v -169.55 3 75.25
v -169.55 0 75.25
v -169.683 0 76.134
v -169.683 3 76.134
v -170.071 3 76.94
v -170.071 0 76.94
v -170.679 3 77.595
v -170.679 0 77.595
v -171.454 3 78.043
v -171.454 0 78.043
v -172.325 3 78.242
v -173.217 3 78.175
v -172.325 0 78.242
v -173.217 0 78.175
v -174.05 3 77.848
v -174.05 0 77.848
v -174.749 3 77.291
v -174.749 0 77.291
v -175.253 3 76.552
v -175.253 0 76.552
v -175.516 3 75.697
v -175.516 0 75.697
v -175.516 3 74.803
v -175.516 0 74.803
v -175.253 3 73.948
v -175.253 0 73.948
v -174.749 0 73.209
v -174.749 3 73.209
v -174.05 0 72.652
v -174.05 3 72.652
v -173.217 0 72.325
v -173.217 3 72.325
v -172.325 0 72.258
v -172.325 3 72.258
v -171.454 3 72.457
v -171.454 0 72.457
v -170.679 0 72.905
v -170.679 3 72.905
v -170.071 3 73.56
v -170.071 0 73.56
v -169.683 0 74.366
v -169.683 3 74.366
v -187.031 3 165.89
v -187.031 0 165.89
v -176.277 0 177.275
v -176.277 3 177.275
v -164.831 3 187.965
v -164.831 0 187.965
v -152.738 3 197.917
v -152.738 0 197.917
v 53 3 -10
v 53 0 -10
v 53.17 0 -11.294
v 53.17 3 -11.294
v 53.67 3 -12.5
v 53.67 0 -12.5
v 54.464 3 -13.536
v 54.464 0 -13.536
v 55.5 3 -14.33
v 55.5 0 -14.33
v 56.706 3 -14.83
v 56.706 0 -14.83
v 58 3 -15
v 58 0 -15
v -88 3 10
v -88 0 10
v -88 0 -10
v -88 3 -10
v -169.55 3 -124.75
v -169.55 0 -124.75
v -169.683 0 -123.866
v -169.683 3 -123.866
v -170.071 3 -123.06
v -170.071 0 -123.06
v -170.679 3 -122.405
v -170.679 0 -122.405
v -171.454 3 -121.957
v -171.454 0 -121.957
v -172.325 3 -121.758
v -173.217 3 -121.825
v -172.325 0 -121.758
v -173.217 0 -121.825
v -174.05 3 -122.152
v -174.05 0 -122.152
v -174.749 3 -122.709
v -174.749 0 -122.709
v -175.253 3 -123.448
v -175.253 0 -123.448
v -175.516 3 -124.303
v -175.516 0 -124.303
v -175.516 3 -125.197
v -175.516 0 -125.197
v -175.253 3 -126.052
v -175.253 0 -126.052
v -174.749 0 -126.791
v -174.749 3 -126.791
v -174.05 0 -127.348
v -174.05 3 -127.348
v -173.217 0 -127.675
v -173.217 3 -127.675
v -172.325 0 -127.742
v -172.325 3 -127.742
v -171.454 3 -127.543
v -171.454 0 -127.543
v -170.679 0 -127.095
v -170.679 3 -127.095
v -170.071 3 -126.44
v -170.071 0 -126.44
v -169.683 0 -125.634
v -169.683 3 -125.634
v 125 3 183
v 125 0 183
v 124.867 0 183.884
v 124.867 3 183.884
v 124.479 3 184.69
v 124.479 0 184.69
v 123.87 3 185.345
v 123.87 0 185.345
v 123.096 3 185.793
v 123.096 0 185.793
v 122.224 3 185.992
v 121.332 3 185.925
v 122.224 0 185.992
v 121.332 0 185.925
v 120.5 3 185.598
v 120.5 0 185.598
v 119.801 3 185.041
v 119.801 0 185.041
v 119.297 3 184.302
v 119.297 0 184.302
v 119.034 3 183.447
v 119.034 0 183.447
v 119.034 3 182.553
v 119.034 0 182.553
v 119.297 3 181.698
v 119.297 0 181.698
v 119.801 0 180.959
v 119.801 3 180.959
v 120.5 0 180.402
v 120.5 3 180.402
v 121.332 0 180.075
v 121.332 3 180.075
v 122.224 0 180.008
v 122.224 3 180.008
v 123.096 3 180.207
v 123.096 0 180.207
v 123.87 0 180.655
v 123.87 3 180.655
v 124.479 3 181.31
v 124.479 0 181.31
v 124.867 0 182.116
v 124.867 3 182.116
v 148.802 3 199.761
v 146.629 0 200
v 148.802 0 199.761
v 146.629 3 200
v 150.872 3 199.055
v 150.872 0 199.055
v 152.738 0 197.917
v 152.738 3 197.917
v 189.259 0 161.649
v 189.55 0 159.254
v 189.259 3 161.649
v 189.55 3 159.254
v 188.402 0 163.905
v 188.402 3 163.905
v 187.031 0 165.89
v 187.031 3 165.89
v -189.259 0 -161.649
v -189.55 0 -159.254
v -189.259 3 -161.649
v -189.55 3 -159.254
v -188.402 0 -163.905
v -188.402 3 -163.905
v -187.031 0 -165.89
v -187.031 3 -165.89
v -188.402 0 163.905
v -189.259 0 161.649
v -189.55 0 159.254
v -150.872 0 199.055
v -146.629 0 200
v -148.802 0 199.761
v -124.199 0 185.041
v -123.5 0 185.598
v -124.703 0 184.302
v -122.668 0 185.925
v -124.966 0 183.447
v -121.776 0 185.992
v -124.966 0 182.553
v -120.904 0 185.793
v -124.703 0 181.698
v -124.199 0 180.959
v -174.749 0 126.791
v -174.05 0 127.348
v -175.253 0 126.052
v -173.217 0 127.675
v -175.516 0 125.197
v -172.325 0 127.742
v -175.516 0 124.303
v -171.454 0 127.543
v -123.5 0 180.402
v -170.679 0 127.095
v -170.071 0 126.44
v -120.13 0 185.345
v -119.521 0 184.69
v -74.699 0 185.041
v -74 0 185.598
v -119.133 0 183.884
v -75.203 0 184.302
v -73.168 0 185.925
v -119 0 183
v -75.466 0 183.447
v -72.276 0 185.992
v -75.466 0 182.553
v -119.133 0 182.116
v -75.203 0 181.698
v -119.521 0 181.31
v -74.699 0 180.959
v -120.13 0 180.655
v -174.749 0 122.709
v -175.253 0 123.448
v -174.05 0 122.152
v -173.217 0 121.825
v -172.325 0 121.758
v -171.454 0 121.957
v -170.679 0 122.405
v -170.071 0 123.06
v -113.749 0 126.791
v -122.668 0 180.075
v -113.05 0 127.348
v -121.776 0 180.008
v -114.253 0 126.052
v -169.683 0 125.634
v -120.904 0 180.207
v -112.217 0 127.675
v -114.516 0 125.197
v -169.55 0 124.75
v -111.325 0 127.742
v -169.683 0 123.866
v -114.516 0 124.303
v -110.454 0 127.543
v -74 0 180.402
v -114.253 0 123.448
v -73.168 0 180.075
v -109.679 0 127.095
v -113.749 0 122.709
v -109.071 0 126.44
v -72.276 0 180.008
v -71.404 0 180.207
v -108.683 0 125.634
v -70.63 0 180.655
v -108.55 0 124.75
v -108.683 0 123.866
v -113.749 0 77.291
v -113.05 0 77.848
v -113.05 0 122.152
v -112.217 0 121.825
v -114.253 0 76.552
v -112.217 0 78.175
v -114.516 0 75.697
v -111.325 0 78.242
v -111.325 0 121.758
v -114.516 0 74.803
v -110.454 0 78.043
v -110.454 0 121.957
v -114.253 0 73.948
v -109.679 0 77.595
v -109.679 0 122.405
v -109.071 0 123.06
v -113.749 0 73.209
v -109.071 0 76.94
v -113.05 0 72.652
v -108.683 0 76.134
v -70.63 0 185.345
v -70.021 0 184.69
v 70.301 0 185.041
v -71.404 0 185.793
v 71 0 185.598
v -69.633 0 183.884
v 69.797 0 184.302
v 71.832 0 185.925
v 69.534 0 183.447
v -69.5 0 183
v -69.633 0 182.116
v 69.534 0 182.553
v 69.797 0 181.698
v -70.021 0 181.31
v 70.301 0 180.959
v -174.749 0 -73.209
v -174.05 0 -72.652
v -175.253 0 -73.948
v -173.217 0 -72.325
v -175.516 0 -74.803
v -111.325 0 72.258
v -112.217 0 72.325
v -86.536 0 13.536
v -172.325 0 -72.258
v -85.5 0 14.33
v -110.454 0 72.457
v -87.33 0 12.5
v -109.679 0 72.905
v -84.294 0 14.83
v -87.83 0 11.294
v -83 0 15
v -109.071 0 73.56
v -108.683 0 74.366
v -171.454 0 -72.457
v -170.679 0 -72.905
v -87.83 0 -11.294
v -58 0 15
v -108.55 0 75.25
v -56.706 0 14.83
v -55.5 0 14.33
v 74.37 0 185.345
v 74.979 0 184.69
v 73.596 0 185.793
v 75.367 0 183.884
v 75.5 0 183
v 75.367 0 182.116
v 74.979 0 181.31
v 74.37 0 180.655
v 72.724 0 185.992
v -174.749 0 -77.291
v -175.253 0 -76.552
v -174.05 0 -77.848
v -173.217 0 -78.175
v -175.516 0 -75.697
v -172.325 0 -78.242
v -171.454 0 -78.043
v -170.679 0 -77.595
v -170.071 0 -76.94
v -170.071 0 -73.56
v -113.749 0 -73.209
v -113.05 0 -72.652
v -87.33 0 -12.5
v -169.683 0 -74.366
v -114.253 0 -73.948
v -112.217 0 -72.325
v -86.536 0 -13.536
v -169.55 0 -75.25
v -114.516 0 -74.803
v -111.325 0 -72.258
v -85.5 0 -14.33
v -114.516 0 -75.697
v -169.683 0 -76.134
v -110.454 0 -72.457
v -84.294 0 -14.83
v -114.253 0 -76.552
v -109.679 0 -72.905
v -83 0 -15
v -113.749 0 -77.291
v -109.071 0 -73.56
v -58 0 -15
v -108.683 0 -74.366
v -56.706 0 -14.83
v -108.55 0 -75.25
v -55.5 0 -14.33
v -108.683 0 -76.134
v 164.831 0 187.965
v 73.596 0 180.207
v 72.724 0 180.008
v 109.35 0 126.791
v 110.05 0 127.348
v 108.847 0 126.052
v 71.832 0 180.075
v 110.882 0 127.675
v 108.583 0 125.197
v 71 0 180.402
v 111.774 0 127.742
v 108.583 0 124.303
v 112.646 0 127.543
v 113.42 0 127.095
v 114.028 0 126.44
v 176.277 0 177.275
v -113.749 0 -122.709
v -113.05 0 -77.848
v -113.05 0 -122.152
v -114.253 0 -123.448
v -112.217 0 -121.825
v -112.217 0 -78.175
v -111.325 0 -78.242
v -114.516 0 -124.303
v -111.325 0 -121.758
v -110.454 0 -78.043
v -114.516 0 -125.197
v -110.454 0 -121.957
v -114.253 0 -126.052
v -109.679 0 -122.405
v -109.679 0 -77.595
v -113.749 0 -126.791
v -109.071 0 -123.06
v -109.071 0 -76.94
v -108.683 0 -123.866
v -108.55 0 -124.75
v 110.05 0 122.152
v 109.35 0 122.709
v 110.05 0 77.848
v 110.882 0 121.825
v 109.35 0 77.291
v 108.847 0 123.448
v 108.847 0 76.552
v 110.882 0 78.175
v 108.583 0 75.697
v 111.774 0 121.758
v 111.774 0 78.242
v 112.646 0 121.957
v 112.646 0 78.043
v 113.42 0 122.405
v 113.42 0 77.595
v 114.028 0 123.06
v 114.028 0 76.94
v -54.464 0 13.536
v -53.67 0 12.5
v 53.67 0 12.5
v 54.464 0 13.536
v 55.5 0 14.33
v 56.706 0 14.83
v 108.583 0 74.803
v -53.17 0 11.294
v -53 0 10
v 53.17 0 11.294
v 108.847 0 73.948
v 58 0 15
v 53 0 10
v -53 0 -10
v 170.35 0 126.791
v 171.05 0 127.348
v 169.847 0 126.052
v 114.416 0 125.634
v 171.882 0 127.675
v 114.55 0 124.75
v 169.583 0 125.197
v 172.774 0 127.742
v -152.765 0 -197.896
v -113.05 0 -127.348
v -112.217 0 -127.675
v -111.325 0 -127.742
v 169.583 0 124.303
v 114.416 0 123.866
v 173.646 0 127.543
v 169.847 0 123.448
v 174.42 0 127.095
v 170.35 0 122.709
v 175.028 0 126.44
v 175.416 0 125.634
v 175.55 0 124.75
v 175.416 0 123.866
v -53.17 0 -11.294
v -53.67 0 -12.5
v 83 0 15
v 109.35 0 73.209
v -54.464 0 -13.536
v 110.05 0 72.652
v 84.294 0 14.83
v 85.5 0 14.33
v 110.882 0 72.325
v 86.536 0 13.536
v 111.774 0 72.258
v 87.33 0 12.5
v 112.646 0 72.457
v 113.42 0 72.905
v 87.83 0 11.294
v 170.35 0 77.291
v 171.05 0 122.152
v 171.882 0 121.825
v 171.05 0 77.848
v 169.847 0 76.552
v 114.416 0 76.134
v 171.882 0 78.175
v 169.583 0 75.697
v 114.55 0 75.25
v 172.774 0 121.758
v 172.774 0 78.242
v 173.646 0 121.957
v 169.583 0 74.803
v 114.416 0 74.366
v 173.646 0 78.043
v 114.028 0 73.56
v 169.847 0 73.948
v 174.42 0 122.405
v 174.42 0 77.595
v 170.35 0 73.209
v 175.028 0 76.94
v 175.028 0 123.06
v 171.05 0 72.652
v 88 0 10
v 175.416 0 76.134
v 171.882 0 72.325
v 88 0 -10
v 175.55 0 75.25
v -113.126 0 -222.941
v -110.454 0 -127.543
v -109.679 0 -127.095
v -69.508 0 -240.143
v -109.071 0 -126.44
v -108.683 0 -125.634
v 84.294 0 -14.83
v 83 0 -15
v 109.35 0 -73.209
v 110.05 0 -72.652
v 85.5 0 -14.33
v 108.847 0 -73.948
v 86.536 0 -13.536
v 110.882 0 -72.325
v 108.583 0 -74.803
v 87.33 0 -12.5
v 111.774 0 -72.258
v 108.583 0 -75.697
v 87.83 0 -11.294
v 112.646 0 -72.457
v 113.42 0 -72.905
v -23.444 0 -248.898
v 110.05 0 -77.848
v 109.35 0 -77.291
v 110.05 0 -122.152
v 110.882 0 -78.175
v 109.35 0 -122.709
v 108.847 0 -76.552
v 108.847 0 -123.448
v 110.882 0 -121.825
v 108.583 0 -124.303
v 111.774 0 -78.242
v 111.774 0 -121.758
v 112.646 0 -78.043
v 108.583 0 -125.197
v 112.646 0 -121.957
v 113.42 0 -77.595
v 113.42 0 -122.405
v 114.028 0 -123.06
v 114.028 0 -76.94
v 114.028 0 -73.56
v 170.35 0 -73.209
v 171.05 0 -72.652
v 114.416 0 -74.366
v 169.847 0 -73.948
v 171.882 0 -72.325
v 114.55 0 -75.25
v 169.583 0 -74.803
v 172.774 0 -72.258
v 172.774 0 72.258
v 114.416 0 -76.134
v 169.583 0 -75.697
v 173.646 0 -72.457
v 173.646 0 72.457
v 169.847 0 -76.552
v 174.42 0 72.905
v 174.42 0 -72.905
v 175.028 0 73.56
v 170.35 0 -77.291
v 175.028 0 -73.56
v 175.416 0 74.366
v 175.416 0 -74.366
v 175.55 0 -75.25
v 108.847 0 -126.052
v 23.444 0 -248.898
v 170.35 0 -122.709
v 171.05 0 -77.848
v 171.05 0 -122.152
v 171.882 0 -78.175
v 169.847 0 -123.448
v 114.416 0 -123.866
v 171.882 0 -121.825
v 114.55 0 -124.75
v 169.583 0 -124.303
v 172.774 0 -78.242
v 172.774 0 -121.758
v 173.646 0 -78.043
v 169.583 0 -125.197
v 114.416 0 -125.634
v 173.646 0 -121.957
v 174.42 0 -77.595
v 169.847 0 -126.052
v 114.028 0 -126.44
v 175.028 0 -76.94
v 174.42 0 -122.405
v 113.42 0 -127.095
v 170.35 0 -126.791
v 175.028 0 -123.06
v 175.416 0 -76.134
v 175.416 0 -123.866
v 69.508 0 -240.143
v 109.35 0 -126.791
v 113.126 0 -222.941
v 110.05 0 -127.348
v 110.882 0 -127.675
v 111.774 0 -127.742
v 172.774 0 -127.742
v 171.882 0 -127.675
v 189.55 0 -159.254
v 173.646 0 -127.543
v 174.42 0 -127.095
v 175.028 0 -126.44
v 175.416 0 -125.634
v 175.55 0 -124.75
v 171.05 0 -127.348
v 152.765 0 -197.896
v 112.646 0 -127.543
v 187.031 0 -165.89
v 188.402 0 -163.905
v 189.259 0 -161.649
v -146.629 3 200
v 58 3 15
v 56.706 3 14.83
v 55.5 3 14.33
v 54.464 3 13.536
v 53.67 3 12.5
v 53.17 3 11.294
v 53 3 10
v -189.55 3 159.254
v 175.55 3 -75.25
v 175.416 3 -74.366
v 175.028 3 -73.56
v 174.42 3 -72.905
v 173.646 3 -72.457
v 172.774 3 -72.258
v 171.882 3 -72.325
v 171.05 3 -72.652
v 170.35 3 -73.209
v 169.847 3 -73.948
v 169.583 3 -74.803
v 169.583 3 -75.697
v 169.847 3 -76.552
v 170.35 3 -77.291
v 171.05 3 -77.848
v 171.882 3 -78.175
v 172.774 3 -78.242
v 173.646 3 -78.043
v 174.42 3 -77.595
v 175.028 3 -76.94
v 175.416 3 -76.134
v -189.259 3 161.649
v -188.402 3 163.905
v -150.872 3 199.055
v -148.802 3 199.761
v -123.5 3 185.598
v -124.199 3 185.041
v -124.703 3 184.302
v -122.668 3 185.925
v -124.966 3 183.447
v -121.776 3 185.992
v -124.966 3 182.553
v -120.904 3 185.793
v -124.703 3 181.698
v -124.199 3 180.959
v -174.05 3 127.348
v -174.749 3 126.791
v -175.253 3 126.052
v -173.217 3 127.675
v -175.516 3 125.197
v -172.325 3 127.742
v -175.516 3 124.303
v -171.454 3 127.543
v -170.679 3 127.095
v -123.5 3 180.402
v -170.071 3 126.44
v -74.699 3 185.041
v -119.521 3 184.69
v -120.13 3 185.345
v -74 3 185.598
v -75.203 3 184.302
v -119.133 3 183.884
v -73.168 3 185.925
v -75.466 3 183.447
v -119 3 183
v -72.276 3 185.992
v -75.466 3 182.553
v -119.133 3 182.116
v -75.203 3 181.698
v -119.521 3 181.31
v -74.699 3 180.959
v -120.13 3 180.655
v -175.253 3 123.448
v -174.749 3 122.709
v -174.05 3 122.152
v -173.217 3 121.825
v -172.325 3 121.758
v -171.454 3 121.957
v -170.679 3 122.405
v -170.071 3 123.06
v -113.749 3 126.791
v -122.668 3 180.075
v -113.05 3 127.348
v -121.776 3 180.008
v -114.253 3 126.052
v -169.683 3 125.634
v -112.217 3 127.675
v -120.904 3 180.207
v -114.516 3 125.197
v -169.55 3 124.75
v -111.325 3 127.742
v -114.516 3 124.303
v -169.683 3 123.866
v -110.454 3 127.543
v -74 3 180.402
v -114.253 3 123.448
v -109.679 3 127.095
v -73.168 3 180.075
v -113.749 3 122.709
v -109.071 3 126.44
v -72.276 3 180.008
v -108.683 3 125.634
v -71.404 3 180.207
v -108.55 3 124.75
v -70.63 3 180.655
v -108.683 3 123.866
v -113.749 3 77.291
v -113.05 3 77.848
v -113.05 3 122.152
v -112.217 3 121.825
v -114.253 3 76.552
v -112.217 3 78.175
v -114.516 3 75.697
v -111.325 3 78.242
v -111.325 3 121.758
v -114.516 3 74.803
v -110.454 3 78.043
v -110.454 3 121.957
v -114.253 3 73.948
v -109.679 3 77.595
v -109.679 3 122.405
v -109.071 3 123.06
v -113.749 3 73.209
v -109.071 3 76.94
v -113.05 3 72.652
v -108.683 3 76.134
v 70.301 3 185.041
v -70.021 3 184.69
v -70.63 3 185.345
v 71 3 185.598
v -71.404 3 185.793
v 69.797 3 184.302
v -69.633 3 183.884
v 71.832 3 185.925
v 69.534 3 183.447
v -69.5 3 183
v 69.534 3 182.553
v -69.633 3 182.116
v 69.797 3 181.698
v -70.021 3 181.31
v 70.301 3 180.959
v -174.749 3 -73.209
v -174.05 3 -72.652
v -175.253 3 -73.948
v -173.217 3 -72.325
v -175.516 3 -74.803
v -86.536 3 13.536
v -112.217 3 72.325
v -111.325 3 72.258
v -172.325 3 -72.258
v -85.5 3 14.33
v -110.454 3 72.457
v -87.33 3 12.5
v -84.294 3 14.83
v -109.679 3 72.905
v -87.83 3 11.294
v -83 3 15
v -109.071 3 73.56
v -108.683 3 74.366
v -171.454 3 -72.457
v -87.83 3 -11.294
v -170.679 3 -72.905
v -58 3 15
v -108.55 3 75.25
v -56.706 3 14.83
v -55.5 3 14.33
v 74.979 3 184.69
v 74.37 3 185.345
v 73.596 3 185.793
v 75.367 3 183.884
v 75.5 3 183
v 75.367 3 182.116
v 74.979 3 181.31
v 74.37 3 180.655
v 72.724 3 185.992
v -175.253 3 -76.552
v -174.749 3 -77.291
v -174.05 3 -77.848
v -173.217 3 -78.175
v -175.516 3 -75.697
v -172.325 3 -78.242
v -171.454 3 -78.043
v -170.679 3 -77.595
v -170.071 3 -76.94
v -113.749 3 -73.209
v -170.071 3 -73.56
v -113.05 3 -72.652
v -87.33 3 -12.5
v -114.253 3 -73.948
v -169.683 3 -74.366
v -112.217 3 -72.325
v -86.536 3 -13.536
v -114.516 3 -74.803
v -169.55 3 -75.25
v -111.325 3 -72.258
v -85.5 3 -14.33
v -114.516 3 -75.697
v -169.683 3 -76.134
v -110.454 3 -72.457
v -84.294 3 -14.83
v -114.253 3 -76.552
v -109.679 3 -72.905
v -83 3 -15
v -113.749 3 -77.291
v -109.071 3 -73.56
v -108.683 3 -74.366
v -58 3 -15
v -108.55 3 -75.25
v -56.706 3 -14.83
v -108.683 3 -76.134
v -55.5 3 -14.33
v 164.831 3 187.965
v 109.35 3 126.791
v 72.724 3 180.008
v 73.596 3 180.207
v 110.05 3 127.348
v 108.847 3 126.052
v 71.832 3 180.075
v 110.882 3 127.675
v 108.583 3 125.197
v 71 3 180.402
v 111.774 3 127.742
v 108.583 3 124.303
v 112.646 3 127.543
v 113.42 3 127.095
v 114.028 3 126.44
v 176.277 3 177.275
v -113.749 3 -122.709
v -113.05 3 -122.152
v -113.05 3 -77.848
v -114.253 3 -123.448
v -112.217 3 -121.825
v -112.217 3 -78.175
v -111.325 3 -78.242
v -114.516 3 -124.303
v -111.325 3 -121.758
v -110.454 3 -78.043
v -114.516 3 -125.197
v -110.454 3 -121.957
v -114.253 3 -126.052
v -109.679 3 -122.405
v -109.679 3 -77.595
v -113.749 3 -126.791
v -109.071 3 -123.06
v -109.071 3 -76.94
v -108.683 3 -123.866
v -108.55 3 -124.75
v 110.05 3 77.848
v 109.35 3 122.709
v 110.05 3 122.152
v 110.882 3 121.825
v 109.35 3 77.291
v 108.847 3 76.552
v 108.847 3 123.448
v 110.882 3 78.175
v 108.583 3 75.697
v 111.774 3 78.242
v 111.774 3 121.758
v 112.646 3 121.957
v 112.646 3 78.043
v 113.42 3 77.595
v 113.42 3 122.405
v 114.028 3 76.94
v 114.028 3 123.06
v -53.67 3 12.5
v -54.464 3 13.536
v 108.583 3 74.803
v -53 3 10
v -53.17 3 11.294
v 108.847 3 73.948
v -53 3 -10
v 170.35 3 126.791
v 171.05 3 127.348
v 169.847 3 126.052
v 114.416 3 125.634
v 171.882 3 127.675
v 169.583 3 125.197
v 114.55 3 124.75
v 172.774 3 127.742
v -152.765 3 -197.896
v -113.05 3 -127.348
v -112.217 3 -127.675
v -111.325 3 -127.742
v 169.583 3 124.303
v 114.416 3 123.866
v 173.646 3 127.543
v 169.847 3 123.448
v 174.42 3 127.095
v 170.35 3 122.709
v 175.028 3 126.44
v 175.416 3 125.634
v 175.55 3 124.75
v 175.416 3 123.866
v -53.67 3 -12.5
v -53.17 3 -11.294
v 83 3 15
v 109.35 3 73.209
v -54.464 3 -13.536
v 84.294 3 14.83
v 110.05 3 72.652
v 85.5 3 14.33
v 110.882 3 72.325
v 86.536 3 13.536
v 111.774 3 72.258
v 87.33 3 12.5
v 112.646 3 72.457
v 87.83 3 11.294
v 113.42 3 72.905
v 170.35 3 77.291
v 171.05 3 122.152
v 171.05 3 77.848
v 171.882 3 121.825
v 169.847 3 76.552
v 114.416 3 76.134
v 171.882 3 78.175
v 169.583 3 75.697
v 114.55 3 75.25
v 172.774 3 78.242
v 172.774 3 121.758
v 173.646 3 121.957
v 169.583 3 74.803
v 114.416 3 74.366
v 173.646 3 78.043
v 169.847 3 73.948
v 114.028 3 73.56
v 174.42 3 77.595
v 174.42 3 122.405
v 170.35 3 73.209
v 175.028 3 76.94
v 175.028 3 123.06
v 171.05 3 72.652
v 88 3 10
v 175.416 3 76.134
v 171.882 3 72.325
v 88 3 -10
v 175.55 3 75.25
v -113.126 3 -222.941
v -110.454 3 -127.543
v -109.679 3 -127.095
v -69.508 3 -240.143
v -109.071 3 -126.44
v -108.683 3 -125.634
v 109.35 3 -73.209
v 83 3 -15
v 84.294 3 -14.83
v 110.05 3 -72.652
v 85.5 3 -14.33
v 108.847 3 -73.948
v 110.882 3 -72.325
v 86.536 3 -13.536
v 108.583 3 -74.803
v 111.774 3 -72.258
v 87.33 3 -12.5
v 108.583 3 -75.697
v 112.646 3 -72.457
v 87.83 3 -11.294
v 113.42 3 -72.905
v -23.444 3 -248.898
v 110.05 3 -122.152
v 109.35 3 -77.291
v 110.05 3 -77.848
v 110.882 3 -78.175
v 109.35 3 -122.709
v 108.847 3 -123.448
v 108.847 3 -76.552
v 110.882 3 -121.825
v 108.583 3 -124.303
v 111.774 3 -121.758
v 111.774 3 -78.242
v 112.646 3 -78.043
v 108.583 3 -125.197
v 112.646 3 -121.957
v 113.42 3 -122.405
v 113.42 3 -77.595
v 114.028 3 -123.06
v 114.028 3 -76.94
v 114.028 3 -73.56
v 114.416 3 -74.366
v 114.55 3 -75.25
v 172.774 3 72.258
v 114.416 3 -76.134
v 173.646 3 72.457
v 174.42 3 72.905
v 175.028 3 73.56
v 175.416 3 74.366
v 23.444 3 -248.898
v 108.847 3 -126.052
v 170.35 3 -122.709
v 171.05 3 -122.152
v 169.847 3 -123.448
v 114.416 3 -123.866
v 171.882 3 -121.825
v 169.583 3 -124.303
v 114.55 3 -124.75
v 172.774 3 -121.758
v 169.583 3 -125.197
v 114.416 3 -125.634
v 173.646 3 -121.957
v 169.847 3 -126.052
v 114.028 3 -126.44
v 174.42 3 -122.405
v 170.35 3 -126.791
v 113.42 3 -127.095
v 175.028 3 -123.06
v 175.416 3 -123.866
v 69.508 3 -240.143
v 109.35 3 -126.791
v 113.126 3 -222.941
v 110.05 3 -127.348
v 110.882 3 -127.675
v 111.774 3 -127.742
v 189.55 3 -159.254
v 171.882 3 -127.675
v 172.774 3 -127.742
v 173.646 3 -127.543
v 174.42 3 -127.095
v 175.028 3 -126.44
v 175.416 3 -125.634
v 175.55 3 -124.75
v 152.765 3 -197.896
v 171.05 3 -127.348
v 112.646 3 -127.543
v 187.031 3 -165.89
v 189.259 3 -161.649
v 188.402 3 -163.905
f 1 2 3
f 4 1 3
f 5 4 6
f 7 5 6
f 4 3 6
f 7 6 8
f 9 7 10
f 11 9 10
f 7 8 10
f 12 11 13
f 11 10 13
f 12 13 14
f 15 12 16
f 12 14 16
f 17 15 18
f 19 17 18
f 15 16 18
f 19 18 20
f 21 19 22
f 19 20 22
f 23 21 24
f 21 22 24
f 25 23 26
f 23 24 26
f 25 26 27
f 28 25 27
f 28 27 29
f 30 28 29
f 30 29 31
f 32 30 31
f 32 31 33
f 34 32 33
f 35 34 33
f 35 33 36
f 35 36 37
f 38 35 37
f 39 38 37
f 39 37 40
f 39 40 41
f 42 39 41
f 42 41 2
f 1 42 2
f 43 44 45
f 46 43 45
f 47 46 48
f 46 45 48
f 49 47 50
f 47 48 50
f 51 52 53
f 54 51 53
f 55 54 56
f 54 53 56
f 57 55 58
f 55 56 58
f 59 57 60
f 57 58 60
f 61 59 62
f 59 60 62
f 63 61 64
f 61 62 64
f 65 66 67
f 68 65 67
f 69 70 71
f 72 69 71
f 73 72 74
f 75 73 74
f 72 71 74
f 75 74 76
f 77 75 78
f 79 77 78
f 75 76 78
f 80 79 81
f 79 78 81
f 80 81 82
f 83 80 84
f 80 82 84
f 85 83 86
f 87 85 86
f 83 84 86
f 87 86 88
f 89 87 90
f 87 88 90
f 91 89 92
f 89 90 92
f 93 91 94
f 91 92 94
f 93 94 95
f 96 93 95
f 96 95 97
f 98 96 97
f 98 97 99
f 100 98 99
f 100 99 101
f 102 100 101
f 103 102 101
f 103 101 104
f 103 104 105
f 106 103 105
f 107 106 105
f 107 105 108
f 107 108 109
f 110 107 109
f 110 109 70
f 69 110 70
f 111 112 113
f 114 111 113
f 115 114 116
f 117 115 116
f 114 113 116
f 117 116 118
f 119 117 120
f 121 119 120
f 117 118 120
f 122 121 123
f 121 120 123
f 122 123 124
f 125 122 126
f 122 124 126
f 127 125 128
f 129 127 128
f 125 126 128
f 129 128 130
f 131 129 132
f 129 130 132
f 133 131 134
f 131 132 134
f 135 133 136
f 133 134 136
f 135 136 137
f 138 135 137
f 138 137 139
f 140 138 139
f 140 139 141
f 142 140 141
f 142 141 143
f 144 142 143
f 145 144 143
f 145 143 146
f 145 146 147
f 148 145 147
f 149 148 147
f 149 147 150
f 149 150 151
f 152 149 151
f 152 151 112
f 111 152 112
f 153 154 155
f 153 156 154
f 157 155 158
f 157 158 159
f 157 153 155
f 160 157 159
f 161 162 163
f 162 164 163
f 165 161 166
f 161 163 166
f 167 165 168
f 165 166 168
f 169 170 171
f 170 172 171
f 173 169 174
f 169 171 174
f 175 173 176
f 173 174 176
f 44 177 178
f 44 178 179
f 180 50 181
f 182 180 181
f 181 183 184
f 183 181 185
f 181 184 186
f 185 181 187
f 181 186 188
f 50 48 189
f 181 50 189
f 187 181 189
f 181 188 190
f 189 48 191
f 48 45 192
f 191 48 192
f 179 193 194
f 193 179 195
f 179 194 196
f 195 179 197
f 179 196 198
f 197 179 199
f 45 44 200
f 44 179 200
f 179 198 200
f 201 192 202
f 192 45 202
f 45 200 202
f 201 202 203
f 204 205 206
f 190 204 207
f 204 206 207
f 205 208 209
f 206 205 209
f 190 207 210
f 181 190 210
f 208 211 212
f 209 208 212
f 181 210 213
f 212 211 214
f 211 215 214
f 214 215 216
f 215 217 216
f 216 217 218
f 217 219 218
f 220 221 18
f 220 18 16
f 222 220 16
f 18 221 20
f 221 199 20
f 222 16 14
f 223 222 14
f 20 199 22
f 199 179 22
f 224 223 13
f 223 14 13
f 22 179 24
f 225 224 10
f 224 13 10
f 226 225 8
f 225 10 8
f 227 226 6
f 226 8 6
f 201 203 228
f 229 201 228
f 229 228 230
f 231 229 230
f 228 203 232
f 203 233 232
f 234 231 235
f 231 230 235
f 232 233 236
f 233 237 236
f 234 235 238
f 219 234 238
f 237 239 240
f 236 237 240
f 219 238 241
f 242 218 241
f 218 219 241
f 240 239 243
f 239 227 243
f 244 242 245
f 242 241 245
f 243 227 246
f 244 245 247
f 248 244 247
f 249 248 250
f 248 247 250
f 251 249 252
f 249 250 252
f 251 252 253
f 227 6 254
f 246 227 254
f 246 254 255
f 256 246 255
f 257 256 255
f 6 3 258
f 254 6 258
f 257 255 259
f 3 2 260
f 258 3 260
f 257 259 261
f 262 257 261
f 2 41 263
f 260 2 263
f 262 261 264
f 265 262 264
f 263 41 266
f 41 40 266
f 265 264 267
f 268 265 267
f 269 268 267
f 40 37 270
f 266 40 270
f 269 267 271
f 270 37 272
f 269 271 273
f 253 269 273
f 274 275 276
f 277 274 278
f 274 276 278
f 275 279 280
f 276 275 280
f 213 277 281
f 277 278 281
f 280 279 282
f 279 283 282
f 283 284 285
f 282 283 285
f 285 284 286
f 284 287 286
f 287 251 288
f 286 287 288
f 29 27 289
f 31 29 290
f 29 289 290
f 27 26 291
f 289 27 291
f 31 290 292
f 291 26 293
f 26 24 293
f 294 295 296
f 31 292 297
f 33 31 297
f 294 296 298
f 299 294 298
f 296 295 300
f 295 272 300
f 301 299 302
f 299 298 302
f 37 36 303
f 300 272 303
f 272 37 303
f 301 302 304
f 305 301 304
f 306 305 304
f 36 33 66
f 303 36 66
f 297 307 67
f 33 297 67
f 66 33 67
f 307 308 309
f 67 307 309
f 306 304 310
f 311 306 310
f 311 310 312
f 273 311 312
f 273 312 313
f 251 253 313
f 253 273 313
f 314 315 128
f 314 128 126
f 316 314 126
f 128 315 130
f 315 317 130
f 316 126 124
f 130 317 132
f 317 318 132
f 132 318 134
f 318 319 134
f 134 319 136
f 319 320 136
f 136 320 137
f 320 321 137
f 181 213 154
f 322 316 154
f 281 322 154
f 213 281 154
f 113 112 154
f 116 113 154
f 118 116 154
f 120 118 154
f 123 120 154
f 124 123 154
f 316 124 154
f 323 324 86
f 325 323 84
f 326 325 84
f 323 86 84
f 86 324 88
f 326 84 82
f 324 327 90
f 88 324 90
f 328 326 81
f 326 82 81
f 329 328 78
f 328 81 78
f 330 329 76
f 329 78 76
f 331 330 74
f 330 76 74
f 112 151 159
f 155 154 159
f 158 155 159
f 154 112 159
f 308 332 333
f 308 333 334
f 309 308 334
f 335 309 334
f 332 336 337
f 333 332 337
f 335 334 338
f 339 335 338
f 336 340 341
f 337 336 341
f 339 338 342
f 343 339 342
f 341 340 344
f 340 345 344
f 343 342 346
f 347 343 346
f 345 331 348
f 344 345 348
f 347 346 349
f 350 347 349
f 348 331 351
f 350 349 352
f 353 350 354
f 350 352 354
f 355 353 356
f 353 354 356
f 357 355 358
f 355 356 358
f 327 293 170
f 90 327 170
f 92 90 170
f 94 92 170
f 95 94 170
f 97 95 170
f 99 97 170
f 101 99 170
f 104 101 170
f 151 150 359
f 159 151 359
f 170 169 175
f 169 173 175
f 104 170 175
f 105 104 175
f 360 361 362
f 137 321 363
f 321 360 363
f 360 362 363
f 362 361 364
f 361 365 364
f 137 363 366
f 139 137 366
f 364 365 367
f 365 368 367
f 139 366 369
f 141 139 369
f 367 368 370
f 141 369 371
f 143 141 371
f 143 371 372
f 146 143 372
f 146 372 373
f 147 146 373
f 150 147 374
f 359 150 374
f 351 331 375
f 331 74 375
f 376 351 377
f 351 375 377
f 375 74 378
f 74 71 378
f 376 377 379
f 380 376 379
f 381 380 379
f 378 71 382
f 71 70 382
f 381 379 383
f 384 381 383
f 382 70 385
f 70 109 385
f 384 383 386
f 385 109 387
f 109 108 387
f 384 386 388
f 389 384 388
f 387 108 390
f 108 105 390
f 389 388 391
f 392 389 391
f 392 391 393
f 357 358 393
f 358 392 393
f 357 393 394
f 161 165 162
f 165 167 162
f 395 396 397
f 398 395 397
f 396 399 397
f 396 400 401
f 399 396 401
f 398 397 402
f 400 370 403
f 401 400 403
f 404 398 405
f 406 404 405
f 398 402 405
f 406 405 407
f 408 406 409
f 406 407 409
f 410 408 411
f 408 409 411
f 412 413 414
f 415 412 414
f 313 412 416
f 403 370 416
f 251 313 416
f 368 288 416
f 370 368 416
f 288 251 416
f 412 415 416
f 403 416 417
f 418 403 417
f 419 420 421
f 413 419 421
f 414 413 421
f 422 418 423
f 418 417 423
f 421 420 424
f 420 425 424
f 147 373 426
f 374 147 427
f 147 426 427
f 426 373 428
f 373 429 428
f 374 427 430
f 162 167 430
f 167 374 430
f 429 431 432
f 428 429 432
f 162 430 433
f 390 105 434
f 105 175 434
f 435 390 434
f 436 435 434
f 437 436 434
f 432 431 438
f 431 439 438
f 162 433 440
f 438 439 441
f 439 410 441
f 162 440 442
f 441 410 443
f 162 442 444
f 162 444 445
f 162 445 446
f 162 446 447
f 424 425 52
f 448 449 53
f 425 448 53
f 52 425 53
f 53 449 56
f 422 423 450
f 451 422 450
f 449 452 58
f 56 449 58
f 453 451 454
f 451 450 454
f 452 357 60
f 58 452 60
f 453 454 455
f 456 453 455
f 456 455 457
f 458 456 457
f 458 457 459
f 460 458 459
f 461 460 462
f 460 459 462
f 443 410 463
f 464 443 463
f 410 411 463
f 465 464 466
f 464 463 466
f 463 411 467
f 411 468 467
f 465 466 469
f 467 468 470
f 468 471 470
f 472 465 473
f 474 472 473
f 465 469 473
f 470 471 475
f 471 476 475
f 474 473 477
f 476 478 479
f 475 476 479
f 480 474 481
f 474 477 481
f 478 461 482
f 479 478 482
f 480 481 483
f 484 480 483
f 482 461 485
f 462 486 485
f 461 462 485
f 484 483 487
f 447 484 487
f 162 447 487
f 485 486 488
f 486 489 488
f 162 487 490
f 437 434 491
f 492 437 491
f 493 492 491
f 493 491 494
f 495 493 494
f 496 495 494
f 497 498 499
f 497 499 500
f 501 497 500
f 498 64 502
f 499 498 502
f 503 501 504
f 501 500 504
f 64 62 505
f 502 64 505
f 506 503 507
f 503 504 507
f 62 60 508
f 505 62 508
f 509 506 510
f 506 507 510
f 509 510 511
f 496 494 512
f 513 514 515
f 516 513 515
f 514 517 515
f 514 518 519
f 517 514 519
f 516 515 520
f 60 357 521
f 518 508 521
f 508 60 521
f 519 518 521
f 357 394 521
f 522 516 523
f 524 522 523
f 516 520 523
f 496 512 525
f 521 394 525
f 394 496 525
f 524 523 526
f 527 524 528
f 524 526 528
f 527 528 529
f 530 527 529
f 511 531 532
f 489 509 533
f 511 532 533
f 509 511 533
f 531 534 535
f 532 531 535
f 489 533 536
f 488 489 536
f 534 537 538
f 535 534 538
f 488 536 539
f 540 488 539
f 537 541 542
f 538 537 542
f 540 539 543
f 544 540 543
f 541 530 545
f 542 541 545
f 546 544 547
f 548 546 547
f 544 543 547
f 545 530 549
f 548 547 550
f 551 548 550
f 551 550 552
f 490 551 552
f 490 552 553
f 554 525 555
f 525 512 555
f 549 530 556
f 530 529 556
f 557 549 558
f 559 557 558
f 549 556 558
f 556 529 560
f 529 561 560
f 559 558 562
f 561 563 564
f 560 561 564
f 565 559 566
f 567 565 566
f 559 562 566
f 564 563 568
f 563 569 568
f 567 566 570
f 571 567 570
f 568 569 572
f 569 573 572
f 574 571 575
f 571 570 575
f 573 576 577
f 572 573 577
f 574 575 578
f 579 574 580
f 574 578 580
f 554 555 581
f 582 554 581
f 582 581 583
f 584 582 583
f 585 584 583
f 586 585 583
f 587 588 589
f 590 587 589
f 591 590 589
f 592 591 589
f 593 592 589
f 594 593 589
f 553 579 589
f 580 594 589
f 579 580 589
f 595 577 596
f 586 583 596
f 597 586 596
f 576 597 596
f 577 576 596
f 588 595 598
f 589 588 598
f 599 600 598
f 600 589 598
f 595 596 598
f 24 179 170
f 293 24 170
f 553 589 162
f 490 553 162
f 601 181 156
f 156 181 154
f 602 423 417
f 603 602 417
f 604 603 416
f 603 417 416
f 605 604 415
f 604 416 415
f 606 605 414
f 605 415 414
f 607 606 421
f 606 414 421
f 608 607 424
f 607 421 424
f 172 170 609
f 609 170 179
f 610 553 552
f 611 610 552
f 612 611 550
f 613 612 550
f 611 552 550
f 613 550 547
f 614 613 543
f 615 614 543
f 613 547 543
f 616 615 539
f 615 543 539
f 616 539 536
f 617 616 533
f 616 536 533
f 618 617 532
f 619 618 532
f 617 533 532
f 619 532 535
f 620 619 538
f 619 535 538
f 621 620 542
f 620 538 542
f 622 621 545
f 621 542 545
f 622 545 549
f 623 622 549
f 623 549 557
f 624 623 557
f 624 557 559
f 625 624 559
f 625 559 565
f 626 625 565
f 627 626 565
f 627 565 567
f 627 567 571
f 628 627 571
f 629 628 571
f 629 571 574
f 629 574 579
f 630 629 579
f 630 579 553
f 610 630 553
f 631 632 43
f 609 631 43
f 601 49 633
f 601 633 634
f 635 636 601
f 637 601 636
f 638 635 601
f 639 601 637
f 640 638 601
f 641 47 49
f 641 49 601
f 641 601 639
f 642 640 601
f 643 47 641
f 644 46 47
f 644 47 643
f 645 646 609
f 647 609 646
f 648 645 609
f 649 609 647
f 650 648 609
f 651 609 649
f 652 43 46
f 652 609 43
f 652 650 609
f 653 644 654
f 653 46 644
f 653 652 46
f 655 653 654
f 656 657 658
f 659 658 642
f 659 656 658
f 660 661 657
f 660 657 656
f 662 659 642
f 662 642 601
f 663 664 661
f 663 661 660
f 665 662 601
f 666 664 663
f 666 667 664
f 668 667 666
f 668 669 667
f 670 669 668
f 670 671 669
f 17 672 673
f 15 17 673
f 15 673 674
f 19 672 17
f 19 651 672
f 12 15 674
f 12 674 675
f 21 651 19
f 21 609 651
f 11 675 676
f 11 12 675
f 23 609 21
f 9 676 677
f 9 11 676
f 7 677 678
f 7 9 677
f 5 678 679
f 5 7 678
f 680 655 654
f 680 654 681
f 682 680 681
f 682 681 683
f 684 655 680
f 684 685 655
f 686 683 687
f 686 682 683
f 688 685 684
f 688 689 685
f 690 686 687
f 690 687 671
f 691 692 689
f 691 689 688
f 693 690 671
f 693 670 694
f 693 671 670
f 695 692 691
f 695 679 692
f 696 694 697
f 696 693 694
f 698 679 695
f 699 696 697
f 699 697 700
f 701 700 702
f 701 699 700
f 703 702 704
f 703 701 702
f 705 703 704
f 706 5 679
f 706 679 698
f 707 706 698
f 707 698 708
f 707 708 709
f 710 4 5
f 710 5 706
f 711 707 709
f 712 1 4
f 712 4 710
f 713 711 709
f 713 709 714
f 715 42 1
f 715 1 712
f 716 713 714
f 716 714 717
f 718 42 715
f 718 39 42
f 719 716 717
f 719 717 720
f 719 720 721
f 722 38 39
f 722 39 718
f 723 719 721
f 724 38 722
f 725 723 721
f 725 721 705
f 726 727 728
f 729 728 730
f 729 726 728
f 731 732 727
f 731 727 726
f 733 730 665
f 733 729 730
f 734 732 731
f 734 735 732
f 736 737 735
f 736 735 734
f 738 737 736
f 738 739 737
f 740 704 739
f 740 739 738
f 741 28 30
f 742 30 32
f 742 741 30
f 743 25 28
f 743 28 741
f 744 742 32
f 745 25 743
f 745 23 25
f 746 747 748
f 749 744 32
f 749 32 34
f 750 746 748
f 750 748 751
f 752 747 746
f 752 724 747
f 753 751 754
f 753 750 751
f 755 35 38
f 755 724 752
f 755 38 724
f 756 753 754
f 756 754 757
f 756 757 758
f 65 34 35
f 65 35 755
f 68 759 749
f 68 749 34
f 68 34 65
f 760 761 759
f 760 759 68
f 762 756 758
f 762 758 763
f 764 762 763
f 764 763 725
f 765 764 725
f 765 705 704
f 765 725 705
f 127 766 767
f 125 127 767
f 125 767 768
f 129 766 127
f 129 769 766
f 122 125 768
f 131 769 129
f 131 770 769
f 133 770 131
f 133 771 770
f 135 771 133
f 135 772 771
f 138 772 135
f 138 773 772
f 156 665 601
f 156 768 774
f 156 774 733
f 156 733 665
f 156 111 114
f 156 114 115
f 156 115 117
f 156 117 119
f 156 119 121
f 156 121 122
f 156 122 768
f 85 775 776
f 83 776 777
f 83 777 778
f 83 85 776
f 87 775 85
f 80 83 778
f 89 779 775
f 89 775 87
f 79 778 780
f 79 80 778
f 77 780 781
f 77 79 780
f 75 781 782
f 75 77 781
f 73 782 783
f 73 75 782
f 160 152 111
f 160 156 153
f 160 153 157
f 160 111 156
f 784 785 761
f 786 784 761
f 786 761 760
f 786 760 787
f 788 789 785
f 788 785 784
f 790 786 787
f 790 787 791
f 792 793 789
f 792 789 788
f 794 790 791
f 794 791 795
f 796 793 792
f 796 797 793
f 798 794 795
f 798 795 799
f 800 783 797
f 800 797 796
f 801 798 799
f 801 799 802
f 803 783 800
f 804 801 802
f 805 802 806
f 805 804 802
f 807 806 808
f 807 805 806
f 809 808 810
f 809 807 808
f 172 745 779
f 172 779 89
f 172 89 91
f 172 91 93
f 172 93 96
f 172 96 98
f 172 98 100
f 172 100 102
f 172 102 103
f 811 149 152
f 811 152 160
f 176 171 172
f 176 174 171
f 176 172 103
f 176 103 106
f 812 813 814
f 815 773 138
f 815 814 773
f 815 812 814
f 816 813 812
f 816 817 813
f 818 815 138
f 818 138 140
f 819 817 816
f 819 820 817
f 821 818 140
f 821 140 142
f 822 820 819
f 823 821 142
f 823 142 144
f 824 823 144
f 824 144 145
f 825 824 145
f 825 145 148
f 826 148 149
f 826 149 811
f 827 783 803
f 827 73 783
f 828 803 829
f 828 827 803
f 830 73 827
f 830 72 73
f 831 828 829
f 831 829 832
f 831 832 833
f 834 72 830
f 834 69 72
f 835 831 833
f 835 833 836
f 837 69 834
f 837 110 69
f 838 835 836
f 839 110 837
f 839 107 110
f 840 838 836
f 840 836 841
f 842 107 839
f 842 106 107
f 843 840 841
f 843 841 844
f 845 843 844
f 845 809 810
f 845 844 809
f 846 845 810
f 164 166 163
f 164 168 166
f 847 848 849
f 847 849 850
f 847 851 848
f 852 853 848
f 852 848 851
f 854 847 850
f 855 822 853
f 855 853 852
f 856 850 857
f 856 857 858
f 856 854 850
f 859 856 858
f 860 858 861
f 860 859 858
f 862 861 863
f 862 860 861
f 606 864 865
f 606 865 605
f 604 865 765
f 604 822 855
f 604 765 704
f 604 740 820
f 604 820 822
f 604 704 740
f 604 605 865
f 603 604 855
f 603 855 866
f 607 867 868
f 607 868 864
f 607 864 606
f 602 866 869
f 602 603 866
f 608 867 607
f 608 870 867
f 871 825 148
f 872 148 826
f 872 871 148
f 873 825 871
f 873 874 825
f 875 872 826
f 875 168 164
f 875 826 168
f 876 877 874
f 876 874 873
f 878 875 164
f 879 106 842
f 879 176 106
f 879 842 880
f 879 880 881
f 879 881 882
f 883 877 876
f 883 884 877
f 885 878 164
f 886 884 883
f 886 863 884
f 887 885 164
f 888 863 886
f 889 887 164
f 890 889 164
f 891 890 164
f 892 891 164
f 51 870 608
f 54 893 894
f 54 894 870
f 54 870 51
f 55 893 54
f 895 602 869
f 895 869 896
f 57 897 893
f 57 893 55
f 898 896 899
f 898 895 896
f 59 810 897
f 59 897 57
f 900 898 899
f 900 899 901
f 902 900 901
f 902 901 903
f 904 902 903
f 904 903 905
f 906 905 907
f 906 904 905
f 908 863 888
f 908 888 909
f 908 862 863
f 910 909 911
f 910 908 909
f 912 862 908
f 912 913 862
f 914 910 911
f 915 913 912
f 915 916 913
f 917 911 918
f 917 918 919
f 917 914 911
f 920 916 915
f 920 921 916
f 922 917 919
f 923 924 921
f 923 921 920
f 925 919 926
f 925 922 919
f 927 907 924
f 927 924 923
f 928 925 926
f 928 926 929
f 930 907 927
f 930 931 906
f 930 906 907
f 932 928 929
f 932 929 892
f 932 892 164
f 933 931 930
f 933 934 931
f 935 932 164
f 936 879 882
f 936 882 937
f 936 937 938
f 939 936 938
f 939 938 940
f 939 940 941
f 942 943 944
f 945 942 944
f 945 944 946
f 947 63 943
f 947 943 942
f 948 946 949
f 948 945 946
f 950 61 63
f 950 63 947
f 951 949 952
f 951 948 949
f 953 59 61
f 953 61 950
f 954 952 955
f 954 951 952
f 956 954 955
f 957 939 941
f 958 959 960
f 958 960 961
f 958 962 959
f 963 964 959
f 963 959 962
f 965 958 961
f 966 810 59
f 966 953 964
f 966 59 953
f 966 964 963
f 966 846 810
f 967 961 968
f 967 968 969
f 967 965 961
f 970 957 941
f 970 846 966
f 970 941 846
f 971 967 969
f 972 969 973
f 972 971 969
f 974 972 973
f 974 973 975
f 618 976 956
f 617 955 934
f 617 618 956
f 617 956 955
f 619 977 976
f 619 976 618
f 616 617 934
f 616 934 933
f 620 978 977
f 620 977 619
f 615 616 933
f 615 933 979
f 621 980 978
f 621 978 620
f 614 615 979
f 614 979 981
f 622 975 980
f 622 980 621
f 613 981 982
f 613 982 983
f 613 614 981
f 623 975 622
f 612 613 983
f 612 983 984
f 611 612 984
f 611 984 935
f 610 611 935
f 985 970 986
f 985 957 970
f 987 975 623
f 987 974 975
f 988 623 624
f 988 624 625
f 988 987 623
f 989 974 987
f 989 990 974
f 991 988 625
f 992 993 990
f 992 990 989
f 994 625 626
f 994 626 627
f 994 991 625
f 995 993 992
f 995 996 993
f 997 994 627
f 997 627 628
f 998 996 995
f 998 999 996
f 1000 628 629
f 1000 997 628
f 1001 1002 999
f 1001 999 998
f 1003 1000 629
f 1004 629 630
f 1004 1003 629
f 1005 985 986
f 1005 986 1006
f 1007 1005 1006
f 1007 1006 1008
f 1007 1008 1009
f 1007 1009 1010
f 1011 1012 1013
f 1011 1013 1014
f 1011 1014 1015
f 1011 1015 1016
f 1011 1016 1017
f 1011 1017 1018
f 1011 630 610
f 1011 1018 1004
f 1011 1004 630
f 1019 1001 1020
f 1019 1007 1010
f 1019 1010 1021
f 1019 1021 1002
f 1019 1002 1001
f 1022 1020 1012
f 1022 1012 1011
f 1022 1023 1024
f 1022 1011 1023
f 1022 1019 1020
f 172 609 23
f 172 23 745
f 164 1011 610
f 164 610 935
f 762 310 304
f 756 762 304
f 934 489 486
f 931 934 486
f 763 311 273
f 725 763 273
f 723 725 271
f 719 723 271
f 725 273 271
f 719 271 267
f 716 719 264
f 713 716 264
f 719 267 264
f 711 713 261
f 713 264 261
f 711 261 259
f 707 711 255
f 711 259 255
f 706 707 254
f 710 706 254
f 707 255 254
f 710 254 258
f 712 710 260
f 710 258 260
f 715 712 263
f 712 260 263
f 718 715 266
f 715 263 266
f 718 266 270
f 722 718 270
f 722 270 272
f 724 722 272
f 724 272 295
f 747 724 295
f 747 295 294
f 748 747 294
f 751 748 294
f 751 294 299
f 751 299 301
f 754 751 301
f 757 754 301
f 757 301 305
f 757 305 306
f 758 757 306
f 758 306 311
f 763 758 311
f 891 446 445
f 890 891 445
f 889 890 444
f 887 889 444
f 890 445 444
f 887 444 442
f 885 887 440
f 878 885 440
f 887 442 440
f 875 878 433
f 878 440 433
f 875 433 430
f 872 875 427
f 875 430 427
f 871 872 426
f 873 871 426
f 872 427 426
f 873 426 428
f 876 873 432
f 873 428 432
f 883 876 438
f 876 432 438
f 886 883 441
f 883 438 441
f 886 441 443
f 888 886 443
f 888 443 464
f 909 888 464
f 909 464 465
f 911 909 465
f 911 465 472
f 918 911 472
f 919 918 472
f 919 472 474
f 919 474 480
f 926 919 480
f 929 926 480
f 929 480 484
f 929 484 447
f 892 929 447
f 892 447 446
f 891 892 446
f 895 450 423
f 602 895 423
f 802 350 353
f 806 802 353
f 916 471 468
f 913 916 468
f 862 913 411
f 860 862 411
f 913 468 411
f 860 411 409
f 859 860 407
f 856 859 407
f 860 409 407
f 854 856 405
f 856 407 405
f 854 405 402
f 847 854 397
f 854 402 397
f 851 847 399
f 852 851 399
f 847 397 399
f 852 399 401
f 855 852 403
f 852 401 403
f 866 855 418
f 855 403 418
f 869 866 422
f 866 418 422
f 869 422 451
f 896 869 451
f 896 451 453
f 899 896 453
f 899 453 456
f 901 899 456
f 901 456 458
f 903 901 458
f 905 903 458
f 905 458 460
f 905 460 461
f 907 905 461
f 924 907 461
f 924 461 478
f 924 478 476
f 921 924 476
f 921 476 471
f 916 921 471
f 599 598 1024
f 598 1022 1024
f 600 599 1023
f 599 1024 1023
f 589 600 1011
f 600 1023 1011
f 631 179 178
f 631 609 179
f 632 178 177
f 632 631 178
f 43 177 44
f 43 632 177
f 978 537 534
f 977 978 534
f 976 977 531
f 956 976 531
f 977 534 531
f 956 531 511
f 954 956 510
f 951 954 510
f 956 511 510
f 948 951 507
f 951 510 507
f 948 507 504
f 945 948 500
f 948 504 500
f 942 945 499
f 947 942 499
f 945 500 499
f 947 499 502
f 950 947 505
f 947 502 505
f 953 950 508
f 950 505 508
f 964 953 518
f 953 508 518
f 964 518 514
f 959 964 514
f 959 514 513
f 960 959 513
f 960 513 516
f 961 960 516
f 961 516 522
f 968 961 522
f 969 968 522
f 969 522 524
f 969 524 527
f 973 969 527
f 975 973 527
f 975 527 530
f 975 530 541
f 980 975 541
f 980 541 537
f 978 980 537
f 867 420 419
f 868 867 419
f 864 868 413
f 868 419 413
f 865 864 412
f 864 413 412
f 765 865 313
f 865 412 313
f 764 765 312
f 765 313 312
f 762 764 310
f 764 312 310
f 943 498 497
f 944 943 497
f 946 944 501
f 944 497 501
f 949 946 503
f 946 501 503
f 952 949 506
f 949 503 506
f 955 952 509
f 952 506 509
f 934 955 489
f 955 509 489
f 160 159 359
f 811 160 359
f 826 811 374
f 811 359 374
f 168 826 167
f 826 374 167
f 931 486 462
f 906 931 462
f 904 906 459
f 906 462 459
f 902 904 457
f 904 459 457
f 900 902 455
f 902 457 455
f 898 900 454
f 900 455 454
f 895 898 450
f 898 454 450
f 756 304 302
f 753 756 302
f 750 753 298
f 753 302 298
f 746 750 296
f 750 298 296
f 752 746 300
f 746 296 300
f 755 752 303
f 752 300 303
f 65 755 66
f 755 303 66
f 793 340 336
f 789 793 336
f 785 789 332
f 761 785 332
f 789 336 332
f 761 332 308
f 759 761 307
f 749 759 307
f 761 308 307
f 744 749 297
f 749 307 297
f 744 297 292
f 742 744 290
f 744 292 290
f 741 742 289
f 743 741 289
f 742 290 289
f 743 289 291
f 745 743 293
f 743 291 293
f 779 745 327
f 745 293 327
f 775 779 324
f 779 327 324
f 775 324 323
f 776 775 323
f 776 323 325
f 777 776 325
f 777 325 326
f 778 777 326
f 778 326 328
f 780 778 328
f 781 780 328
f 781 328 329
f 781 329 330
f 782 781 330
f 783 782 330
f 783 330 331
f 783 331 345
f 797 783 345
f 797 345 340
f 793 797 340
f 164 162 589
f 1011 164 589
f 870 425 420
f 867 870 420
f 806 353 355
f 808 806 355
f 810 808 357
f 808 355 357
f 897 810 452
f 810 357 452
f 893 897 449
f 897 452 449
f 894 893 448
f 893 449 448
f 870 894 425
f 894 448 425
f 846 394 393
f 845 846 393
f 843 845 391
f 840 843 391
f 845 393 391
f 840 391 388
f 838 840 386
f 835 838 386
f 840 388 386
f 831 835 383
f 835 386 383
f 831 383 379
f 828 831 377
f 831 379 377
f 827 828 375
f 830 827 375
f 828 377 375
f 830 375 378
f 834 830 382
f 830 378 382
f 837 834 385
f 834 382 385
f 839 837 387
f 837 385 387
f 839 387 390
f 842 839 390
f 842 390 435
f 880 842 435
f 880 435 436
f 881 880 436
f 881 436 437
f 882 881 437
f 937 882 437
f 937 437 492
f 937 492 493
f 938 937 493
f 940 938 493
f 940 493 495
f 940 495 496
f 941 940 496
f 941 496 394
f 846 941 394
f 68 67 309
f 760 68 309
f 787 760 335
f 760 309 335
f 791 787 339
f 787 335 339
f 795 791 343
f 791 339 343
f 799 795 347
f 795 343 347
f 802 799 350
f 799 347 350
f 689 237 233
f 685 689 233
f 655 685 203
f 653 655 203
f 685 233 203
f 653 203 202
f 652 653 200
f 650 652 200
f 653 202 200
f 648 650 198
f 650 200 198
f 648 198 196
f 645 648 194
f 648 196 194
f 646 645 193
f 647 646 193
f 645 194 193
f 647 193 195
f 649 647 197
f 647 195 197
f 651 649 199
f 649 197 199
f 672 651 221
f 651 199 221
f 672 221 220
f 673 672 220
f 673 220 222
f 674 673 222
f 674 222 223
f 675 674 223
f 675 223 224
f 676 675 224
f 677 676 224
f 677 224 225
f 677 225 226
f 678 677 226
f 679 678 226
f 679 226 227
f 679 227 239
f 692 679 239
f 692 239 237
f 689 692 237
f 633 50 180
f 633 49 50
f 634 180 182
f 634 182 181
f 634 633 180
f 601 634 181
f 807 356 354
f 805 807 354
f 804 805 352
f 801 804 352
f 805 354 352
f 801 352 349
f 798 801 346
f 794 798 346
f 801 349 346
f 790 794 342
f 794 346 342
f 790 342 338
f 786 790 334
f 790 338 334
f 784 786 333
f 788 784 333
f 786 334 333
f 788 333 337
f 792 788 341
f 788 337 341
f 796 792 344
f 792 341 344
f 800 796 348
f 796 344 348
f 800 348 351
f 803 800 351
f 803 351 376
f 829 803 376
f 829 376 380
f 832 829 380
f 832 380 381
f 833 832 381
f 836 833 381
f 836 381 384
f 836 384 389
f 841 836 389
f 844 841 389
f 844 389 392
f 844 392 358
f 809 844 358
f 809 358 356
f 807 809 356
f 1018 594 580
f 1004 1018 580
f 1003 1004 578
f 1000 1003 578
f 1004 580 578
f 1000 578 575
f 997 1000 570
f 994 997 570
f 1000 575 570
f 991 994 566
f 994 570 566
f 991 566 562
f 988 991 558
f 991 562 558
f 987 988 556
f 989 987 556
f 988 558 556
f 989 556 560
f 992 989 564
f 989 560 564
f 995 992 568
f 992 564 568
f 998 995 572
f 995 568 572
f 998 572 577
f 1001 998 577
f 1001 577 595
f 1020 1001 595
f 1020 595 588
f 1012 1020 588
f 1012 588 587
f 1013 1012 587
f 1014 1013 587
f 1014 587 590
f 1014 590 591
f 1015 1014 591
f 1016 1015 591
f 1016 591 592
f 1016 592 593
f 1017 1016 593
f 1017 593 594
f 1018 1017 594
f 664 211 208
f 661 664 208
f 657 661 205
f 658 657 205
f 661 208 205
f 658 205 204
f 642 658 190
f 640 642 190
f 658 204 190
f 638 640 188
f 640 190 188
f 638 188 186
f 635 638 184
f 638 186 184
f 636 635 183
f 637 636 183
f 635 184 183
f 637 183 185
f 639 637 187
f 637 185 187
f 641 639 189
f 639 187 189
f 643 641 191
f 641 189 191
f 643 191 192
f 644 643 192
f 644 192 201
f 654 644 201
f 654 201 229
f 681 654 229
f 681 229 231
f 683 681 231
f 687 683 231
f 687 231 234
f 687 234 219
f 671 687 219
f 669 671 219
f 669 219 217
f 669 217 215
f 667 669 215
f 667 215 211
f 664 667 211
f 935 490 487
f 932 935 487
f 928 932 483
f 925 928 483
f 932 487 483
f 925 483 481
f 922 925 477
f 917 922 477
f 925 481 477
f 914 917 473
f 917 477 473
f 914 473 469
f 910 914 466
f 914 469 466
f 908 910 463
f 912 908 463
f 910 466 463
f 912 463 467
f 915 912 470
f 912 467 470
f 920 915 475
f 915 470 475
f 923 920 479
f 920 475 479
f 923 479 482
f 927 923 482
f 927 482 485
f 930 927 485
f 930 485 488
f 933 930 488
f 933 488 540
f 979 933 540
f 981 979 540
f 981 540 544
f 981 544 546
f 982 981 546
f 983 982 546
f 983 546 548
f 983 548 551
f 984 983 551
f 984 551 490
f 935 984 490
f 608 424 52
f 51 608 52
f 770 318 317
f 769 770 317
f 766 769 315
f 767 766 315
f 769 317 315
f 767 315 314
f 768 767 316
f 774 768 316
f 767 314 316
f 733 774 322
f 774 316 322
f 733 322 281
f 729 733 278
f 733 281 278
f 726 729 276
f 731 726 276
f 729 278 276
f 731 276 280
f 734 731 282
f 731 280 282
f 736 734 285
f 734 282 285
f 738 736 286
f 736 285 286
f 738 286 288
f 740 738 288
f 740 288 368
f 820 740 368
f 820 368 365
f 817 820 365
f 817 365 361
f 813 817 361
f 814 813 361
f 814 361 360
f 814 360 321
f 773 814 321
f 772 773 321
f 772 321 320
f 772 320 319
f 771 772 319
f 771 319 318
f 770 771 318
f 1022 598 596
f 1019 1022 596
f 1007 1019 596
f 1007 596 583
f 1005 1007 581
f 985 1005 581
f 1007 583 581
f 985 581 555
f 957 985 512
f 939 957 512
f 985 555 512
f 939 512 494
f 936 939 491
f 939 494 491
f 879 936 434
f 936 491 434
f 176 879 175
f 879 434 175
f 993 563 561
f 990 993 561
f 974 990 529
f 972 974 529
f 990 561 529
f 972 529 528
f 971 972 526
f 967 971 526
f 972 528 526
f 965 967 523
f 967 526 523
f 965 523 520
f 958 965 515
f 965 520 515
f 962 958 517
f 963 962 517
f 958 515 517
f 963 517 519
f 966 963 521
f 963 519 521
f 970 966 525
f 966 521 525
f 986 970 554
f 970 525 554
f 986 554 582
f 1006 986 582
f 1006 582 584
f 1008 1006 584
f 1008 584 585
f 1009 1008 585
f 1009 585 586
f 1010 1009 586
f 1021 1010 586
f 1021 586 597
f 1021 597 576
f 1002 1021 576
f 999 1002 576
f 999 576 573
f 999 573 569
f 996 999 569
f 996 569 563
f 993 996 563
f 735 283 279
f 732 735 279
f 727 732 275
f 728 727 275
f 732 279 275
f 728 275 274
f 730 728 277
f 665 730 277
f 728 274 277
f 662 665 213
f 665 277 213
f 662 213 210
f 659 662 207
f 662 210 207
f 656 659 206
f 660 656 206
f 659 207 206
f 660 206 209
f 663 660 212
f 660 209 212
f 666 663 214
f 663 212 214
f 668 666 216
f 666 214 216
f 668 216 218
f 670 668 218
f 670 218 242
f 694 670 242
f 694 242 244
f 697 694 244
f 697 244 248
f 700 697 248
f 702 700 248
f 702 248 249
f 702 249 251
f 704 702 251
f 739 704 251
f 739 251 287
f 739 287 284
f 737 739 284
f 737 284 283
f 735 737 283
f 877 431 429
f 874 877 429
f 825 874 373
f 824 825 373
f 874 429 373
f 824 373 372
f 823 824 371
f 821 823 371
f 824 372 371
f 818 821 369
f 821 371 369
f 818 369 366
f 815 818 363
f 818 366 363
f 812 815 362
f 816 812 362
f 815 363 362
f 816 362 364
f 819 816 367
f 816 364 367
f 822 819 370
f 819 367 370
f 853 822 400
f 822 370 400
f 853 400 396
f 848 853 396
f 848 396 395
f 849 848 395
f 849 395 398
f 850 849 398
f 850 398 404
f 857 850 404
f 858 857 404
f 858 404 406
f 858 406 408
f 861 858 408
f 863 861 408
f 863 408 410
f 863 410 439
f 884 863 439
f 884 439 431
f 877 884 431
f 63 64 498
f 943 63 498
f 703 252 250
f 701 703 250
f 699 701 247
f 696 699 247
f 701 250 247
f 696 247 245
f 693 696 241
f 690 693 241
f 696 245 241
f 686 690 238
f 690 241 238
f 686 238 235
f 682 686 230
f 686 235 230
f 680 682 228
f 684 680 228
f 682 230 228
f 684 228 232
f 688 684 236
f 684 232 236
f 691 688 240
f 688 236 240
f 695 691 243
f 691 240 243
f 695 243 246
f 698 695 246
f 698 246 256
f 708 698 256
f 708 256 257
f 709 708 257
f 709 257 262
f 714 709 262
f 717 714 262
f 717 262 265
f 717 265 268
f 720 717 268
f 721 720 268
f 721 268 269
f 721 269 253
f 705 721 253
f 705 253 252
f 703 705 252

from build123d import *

# Parameters (mm, degrees)
BOSS_EXTRUDE1_DEPTH     = 3
FILLET1_R               = 10
SKETCH2_R               = 3
CUT_EXTRUDE1_DEPTH      = 1
CUT_EXTRUDE1_DEPTH_BACK = 4


with BuildPart() as part:
    # Sketch1 → Boss-Extrude1 (new body)
    with BuildSketch(Plane(origin=(0, 0, 0), x_dir=(1, 0, 0), z_dir=(0, 1, 0))):
        with BuildLine():
            Line((-189.549594269, 163.005985511), (-189.549594269, 15))
            Line((-189.549594269, 15), (-189.549594269, -15))
            Line((-189.549594269, -15), (-189.549594269, -163.005985511))
            ThreePointArc((-189.549594269, -163.005985511), (-170.779451396, -182.577049436), (-150, -200))
            Line((-150, -200), (150, -200))
            ThreePointArc((150, -200), (170.779451396, -182.577049436), (189.549594269, -163.005985511))
            Line((189.549594269, -163.005985511), (189.549594269, -15))
            Line((189.549594269, -15), (189.549594269, 15))
            Line((189.549594269, 15), (189.549594269, 163.005985511))
            ThreePointArc((189.549594269, 163.005985511), (0, 250), (-189.549594269, 163.005985511))
        make_face()
        with BuildLine():
            ThreePointArc((-83, -15), (-86.535533906, -13.535533906), (-88, -10))
            Line((-88, -10), (-88, 10))
            ThreePointArc((-88, 10), (-86.535533906, 13.535533906), (-83, 15))
            Line((-83, 15), (-58, 15))
            ThreePointArc((-58, 15), (-54.464466094, 13.535533906), (-53, 10))
            Line((-53, 10), (-53, -10))
            ThreePointArc((-53, -10), (-54.464466094, -13.535533906), (-58, -15))
            Line((-58, -15), (-83, -15))
        make_face(mode=Mode.SUBTRACT)
        with BuildLine():
            Line((53, -10), (53, 10))
            ThreePointArc((53, 10), (54.464466094, 13.535533906), (58, 15))
            Line((58, 15), (83, 15))
            ThreePointArc((83, 15), (86.535533906, 13.535533906), (88, 10))
            Line((88, 10), (88, -10))
            ThreePointArc((88, -10), (86.535533906, -13.535533906), (83, -15))
            Line((83, -15), (58, -15))
            ThreePointArc((58, -15), (54.464466094, -13.535533906), (53, -10))
        make_face(mode=Mode.SUBTRACT)
    extrude(amount=BOSS_EXTRUDE1_DEPTH)

    # Fillet1
    fillet1_edges = [part.edges().sort_by_distance(p)[0] for p in [
        (189.549594269, 1.5, 163.005985511),
        (150, 1.5, 200),
        (-150, 1.5, 200),
        (-189.549594269, 1.5, 163.005985511),
        (-189.549594269, 1.5, -163.005985511),
        (189.549594269, 1.5, -163.005985511),
    ]]
    fillet(fillet1_edges, radius=FILLET1_R)

    # Sketch2 → Cut-Extrude1 (cut, two sides)
    with BuildSketch(Plane.XZ) as cut_extrude1_sk:
        with Locations((-172.549594269, -124.75)):
            Circle(SKETCH2_R)
        with Locations((-172.549594269, -75.25)):
            Circle(SKETCH2_R)
        with Locations((-111.549594269, -124.75)):
            Circle(SKETCH2_R)
        with Locations((-111.549594269, -75.25)):
            Circle(SKETCH2_R)
        with Locations((111.549594269, -75.25)):
            Circle(SKETCH2_R)
        with Locations((172.549594269, -75.25)):
            Circle(SKETCH2_R)
        with Locations((172.549594269, -124.75)):
            Circle(SKETCH2_R)
        with Locations((111.549594269, -124.75)):
            Circle(SKETCH2_R)
        with Locations((172.549594269, 75.25)):
            Circle(SKETCH2_R)
        with Locations((172.549594269, 124.75)):
            Circle(SKETCH2_R)
        with Locations((111.549594269, 124.75)):
            Circle(SKETCH2_R)
        with Locations((111.549594269, 75.25)):
            Circle(SKETCH2_R)
        with Locations((-172.549594269, 75.25)):
            Circle(SKETCH2_R)
        with Locations((-111.549594269, 75.25)):
            Circle(SKETCH2_R)
        with Locations((-111.549594269, 124.75)):
            Circle(SKETCH2_R)
        with Locations((-172.549594269, 124.75)):
            Circle(SKETCH2_R)
        with Locations((-122, 183)):
            Circle(SKETCH2_R)
        with Locations((-72.5, 183)):
            Circle(SKETCH2_R)
        with Locations((72.5, 183)):
            Circle(SKETCH2_R)
        with Locations((122, 183)):
            Circle(SKETCH2_R)
    extrude(amount=CUT_EXTRUDE1_DEPTH, mode=Mode.SUBTRACT)
    extrude(cut_extrude1_sk.sketch, amount=-CUT_EXTRUDE1_DEPTH_BACK, mode=Mode.SUBTRACT)


solid = part.part
